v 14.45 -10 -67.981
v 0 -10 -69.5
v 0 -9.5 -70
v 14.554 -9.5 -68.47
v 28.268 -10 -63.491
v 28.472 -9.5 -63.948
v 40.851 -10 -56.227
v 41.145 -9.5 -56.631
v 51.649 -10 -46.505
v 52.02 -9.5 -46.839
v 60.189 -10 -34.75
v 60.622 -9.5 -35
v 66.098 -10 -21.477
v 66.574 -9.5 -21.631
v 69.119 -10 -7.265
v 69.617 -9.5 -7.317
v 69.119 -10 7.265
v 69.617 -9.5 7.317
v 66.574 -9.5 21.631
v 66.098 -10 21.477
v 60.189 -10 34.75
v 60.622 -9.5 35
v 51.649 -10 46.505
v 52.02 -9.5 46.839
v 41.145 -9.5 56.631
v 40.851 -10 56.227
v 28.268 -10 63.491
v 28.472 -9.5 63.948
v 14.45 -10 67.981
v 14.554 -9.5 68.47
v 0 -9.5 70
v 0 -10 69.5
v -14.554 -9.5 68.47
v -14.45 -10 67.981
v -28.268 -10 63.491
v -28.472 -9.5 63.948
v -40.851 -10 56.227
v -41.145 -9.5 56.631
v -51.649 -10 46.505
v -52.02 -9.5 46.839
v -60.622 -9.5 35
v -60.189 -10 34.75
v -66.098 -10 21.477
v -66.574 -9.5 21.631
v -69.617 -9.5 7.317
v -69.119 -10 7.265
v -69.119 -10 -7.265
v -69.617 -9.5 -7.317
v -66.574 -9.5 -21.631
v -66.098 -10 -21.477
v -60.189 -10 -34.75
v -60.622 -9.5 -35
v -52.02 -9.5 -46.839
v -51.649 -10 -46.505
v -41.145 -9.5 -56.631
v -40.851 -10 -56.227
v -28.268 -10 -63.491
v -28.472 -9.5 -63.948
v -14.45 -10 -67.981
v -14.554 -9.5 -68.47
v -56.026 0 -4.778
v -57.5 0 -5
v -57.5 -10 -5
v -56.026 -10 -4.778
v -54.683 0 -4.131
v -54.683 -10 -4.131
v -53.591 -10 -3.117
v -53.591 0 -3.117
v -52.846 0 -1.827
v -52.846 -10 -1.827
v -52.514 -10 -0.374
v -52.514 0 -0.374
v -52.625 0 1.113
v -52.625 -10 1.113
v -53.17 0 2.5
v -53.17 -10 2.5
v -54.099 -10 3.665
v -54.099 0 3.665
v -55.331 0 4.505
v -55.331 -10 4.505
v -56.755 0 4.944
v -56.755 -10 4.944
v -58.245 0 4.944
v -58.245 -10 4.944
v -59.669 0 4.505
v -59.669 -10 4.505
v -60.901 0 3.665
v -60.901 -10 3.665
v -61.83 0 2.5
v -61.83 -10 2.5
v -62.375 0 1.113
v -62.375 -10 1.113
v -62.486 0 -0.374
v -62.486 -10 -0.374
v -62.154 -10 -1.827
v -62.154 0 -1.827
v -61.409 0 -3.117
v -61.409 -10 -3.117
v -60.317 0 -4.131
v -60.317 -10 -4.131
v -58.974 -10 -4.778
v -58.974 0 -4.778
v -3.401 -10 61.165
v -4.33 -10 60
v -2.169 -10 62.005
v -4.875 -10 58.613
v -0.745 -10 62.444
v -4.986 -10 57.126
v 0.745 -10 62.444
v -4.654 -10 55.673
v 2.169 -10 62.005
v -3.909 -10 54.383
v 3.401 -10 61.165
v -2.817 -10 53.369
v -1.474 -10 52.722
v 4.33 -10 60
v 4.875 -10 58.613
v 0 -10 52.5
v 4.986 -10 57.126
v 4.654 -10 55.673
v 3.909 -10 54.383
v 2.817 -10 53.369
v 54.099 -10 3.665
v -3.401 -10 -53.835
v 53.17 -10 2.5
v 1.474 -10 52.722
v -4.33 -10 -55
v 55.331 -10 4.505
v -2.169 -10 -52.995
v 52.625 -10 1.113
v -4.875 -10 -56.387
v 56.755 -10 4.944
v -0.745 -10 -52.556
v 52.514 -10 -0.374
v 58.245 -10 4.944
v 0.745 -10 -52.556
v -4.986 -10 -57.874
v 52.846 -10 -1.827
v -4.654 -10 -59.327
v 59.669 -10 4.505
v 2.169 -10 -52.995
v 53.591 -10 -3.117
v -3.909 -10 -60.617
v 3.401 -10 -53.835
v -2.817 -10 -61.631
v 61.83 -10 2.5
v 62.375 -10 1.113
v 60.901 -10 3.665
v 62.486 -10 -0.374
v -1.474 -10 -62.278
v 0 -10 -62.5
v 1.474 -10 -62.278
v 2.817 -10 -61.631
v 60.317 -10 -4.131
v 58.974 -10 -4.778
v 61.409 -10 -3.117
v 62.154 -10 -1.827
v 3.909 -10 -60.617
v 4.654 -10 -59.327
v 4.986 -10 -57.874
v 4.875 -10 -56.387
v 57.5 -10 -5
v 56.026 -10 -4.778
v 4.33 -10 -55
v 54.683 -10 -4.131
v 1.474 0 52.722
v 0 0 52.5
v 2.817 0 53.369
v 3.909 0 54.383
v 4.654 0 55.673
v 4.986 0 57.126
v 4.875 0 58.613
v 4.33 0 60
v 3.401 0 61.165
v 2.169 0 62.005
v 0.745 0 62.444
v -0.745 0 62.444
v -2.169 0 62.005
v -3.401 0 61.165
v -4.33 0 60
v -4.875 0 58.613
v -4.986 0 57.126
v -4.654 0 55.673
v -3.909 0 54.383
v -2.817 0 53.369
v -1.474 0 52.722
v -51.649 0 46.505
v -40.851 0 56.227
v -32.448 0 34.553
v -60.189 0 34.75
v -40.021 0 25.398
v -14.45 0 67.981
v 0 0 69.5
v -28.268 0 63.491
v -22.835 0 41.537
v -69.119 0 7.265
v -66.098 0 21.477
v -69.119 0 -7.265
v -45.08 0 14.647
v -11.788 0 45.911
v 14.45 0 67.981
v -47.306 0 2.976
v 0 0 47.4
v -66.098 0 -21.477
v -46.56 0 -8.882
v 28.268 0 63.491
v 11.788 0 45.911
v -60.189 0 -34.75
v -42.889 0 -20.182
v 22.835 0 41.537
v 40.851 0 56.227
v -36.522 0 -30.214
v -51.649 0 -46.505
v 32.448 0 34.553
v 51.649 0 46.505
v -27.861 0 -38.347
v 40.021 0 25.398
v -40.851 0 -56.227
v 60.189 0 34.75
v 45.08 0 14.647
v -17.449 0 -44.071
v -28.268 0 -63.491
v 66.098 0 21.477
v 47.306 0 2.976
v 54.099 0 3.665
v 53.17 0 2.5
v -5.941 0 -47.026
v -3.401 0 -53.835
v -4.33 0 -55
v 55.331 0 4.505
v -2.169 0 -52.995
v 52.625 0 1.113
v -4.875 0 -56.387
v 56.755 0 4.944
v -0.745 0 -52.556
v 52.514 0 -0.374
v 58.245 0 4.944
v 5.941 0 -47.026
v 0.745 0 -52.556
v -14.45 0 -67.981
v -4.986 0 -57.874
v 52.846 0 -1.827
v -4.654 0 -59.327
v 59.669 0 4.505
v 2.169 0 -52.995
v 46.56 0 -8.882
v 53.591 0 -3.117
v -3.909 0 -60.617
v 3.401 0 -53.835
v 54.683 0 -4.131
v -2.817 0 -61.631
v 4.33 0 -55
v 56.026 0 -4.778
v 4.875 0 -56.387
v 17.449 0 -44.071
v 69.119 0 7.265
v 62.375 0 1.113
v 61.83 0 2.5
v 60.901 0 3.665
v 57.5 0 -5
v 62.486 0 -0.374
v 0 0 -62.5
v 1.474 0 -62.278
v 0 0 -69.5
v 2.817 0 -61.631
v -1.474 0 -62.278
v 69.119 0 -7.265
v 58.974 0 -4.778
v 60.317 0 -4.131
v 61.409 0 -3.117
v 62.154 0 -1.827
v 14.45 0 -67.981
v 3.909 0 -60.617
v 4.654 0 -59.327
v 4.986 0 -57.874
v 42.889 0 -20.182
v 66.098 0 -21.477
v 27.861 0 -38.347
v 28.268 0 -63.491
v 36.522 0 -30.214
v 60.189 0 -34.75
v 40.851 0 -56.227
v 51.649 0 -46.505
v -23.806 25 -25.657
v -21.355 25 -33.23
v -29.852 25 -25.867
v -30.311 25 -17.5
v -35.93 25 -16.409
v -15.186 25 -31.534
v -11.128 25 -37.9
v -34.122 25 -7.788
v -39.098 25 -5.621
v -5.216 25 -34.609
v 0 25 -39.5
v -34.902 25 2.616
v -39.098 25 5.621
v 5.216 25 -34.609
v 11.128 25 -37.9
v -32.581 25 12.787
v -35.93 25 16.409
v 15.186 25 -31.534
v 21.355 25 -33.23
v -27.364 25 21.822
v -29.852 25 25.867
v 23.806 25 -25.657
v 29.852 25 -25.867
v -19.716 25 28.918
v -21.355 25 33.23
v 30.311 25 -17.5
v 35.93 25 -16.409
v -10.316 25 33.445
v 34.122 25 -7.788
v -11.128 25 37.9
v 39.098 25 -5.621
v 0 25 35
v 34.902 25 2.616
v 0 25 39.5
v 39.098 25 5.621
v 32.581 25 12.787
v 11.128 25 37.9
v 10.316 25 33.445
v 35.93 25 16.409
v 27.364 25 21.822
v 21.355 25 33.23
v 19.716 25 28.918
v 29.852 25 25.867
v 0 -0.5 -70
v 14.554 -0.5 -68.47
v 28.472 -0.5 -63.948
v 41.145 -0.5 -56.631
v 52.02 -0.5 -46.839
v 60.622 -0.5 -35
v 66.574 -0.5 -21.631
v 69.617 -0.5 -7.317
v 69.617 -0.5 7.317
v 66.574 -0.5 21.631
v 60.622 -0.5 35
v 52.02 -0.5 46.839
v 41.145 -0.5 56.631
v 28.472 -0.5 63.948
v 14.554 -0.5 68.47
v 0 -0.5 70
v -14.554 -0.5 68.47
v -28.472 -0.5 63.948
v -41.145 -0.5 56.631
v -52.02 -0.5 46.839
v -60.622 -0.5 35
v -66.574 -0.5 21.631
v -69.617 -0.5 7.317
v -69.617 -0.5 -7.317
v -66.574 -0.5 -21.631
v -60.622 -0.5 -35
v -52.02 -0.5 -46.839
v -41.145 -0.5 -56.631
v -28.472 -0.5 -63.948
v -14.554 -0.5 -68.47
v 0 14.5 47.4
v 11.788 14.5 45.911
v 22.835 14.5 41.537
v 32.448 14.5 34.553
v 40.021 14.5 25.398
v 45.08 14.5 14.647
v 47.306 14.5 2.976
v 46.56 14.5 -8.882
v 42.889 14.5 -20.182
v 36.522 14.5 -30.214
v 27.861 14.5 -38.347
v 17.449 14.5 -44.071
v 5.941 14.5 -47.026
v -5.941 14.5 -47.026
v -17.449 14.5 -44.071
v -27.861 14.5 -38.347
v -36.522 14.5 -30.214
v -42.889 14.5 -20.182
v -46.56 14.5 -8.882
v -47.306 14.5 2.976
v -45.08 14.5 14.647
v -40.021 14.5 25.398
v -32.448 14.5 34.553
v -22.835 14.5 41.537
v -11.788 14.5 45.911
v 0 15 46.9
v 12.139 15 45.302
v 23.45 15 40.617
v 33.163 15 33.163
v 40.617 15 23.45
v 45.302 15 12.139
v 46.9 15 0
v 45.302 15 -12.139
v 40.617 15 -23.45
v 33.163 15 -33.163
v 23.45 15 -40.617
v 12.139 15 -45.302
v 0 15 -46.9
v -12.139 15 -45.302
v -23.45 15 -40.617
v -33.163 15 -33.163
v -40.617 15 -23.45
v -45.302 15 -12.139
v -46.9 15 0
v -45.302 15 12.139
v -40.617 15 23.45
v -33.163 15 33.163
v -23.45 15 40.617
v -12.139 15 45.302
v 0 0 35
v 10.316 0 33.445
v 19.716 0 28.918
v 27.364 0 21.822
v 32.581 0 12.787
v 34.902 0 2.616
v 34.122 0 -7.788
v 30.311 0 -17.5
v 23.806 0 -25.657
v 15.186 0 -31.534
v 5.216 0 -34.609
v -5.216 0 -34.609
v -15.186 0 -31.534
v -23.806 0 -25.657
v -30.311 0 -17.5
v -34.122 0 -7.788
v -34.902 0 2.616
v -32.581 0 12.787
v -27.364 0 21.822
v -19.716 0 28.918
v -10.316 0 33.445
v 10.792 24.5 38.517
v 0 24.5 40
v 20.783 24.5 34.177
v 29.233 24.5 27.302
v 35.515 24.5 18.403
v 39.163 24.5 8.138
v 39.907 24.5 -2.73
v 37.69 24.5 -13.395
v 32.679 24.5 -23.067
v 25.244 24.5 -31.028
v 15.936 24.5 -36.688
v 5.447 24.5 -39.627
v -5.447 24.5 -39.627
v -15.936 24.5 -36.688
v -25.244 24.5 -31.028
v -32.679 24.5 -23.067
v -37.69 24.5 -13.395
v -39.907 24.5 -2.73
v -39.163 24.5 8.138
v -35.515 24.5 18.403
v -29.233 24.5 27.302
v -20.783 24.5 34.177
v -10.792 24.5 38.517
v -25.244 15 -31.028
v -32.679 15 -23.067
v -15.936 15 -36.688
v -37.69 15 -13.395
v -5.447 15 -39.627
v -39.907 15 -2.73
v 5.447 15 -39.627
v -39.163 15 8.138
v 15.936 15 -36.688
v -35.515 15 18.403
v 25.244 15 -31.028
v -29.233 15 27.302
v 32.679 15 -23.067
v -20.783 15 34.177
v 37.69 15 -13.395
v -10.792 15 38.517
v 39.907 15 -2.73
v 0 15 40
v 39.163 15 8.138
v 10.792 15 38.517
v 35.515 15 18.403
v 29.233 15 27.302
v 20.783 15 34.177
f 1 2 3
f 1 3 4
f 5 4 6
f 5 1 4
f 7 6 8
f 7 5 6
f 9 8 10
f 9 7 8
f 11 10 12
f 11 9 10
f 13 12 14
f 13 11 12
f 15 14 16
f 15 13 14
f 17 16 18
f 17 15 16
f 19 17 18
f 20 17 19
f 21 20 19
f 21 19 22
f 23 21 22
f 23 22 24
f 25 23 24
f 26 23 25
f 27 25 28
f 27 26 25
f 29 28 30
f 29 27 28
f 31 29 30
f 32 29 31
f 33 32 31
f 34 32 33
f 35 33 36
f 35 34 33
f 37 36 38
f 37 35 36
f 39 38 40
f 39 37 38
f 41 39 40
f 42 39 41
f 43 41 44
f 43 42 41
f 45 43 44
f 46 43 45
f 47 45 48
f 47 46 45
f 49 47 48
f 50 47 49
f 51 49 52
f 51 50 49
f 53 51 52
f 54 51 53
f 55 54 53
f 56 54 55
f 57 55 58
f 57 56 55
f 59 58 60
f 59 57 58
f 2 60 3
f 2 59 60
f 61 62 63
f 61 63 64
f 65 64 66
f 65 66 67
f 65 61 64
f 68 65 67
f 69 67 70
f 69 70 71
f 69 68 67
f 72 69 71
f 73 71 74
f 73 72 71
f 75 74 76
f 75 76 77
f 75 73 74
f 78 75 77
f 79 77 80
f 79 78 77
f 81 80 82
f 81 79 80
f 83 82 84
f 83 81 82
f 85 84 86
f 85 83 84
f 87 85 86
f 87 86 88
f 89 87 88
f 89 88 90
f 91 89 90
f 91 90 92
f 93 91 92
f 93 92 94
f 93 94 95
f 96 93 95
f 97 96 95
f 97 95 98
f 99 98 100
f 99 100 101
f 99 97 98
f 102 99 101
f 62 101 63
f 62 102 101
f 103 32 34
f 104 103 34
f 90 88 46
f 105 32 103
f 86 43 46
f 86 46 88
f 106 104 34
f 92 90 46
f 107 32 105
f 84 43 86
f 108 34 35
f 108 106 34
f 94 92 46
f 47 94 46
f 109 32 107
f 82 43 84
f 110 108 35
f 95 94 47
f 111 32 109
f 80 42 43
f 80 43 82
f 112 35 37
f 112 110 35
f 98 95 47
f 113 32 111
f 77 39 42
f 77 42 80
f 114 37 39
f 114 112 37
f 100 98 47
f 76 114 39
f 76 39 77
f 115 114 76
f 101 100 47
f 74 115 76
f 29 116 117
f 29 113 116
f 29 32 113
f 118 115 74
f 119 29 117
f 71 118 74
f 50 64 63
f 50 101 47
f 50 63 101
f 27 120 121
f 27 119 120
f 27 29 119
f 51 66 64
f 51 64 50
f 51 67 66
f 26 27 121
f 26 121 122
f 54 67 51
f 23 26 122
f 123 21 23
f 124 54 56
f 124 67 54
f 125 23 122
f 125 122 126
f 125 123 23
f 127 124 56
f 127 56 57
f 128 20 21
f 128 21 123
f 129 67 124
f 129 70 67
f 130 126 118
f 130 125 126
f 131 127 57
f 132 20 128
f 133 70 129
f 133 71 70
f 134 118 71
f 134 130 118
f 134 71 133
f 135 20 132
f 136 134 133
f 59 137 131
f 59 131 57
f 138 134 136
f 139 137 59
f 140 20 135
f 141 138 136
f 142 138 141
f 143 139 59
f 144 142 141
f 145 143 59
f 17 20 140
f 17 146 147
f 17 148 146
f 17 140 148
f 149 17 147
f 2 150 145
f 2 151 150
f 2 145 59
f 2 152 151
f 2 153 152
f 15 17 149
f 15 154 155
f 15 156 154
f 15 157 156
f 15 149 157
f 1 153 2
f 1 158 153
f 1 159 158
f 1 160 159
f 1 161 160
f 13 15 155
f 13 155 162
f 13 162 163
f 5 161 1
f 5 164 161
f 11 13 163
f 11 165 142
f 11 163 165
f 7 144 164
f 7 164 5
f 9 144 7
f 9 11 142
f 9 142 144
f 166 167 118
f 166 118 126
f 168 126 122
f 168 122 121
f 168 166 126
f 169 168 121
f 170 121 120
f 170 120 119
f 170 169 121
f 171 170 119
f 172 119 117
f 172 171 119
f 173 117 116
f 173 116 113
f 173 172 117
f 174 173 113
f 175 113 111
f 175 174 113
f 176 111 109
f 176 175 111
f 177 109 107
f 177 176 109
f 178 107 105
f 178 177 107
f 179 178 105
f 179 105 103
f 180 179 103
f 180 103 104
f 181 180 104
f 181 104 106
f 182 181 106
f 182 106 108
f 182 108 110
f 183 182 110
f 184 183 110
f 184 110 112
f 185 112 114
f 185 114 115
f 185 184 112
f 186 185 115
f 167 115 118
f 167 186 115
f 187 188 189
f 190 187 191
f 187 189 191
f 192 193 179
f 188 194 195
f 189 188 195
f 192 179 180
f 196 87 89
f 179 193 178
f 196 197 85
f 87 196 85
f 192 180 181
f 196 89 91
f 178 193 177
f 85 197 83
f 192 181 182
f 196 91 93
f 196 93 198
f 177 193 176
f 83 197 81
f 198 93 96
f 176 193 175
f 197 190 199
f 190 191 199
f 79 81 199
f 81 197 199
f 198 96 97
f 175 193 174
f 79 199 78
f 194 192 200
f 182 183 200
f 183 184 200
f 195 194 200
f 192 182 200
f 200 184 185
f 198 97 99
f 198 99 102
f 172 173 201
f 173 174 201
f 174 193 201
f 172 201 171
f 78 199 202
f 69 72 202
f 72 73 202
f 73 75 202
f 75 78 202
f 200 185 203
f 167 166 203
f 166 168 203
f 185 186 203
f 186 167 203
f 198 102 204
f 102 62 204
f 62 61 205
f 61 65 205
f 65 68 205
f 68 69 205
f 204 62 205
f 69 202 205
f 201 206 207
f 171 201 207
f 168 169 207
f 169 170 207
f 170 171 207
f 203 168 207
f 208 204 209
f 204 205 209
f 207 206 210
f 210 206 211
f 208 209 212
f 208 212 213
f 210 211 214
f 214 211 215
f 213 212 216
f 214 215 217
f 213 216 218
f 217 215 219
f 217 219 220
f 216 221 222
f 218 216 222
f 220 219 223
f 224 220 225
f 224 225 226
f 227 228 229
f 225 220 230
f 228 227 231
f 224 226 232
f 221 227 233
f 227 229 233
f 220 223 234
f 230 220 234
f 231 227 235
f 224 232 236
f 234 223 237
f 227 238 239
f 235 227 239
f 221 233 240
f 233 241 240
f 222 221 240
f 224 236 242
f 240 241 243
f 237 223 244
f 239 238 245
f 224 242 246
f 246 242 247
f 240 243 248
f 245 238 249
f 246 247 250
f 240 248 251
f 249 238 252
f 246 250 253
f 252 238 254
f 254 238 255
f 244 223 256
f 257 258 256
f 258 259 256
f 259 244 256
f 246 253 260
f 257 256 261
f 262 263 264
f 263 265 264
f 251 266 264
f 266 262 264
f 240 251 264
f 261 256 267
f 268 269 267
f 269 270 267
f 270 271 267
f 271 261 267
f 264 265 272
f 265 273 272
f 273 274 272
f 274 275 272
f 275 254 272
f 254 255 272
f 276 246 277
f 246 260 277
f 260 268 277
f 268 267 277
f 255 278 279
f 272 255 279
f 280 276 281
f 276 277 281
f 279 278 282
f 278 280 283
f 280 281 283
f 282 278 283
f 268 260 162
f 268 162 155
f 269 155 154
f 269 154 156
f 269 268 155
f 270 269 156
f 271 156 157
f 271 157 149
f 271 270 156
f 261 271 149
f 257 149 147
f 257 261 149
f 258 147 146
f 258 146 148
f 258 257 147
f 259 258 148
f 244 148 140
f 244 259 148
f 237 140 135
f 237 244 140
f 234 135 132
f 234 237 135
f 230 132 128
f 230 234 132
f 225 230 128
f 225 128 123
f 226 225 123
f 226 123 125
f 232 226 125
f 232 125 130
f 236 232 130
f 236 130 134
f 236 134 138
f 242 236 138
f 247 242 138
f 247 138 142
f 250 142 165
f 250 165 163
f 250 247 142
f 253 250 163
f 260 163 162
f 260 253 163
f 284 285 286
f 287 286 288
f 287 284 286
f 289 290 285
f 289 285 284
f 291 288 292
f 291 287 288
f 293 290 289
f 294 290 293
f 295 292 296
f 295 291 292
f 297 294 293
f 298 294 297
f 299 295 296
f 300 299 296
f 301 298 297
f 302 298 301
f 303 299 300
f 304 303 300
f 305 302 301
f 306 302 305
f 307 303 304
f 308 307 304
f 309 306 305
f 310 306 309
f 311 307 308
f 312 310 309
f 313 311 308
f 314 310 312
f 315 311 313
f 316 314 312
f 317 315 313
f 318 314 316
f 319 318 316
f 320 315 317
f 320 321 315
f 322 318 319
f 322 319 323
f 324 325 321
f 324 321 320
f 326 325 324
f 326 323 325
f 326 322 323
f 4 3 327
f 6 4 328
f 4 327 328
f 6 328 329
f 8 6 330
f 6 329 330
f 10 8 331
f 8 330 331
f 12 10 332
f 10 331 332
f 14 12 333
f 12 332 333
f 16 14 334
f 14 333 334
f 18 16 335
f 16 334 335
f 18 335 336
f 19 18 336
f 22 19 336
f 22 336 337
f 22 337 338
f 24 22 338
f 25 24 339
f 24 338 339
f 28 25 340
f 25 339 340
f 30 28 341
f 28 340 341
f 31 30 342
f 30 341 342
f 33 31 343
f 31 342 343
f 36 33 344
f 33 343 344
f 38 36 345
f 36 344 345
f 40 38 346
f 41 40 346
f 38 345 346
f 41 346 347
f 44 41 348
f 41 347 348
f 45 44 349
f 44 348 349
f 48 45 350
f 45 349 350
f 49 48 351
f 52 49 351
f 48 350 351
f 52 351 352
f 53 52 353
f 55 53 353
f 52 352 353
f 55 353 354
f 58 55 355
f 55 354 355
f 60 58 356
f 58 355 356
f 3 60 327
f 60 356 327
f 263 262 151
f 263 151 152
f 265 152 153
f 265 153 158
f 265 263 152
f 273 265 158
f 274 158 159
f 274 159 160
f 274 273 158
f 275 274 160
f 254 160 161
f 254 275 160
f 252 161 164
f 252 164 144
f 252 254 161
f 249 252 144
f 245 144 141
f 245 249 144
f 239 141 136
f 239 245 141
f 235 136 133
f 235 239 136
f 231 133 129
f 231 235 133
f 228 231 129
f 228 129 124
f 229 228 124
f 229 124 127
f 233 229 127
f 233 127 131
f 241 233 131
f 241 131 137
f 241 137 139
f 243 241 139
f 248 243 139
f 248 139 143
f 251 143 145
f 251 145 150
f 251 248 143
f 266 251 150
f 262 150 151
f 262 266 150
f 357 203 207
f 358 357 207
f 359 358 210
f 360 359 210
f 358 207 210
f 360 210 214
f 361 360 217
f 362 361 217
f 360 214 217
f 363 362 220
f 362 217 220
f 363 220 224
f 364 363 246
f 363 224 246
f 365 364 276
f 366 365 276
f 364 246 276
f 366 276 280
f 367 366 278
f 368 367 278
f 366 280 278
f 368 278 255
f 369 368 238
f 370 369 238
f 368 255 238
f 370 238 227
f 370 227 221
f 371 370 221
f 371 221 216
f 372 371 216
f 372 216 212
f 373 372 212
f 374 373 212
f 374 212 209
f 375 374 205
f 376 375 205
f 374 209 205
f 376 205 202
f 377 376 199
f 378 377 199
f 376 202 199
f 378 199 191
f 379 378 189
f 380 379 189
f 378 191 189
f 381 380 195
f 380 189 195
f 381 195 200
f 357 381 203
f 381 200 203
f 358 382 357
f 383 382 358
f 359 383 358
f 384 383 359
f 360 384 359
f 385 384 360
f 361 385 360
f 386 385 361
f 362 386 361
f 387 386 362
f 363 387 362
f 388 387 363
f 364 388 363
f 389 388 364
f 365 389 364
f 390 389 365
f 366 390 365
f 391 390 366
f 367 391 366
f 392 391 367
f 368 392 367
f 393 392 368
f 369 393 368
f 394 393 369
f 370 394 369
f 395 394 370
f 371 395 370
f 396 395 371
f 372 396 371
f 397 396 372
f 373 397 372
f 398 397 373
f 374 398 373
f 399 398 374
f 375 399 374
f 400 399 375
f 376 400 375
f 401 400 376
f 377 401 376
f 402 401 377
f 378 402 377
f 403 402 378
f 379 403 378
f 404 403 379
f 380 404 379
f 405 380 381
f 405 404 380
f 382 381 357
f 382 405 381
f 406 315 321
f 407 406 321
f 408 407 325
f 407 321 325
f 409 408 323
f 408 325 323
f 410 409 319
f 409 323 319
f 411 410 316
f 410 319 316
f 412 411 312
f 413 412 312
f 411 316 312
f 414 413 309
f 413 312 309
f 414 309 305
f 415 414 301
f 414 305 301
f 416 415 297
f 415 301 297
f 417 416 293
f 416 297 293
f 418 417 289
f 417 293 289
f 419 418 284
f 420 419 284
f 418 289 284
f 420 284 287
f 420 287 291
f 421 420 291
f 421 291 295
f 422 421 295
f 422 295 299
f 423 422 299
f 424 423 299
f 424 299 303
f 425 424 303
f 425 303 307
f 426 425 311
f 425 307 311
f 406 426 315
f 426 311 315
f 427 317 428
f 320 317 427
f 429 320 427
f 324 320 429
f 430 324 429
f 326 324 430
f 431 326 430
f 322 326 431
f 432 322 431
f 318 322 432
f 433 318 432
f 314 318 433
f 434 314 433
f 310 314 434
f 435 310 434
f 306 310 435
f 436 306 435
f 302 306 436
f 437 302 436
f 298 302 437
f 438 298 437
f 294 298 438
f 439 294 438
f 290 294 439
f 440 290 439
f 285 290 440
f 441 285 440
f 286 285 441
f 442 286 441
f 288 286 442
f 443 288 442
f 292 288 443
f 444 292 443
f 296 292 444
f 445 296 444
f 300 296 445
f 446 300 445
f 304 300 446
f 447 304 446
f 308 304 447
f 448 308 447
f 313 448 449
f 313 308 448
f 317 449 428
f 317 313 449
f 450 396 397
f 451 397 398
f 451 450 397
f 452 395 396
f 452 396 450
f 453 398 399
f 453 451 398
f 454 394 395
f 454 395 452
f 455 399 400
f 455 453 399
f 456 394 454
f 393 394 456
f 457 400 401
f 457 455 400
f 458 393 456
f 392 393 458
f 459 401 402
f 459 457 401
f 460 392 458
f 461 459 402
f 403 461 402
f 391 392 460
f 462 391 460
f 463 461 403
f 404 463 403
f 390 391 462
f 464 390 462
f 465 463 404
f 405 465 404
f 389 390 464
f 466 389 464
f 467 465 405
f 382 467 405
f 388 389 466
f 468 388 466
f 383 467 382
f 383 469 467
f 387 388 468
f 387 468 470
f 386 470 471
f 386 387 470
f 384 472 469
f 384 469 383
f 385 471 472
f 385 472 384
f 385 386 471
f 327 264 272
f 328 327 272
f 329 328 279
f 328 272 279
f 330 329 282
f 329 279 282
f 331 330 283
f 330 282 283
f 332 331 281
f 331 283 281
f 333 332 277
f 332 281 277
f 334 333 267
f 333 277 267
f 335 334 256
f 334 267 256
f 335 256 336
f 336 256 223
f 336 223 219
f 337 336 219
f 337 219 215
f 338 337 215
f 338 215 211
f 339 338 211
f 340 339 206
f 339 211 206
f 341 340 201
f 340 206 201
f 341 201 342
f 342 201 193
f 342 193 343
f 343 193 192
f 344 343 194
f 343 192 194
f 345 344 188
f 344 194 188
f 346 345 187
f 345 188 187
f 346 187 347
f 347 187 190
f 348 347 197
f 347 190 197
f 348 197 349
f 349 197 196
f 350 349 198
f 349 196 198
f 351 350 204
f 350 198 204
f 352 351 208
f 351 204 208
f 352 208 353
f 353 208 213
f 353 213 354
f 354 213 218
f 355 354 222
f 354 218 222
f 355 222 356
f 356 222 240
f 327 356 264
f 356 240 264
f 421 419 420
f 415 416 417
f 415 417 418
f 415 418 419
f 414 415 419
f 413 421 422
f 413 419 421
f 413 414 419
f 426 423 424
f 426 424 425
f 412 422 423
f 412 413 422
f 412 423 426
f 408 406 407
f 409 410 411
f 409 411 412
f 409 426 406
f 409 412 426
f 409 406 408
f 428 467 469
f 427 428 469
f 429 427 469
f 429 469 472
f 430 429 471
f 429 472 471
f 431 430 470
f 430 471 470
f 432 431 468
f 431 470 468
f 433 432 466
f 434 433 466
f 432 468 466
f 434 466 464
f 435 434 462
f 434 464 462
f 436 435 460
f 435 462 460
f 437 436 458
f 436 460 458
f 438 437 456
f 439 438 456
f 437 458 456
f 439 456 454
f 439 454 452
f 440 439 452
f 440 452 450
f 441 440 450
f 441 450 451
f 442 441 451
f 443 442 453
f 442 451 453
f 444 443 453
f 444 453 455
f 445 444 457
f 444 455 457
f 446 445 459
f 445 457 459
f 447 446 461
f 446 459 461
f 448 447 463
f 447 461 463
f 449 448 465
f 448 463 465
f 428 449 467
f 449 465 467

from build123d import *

# Parameters (mm, degrees)
SKETCH_1_R          = 47.4
EXTRUDE_1_DEPTH     = 15
SKETCH_2_R          = 40
EXTRUDE_2_DEPTH     = 10
SKETCH_3_R          = 70
SKETCH_3_R_2        = 5
EXTRUDE_3_DEPTH     = 10
SKETCH_4_R          = 35
CUT_EXTRUDE_1_DEPTH = 25
CHAMFER_1_SIZE      = 0.5


with BuildPart() as part:
    # 草图1 → 凸台-拉伸1 (new body)
    with BuildSketch(Plane(origin=(0, 0, 0), x_dir=(1, 0, 0), z_dir=(0, 1, 0))):
        with Locations(Location((0, 0, 0), (0, 0, 270))):
            Circle(SKETCH_1_R)
    extrude(amount=EXTRUDE_1_DEPTH)

    # 草图2 → 凸台-拉伸2 (add)
    with BuildSketch(Plane(origin=(0, 15, 0), x_dir=(1, 0, 0), z_dir=(0, 1, 0))):
        with Locations(Location((0, 0, 0), (0, 0, 270))):
            Circle(SKETCH_2_R)
    extrude(amount=EXTRUDE_2_DEPTH)

    # 草图3 → 凸台-拉伸3 (add)
    with BuildSketch(Plane.XZ):
        with Locations(Location((0, 0, 0), (0, 0, 270))):
            Circle(SKETCH_3_R)
        with Locations(Location((0, 57.5, 0), (0, 0, 270))):
            Circle(SKETCH_3_R_2, mode=Mode.SUBTRACT)
        with Locations(Location((57.5, 0, 0), (0, 0, 270))):
            Circle(SKETCH_3_R_2, mode=Mode.SUBTRACT)
        with Locations(Location((0, -57.5, 0), (0, 0, 270))):
            Circle(SKETCH_3_R_2, mode=Mode.SUBTRACT)
        with Locations(Location((-57.5, 0, 0), (0, 0, 270))):
            Circle(SKETCH_3_R_2, mode=Mode.SUBTRACT)
    extrude(amount=EXTRUDE_3_DEPTH)

    # 草图4 → 切除-拉伸1 (cut)
    with BuildSketch(Plane(origin=(0, 25, 0), x_dir=(1, 0, 0), z_dir=(0, 1, 0))):
        with Locations(Location((0, 0, 0), (0, 0, 270))):
            Circle(SKETCH_4_R)
    extrude(amount=-CUT_EXTRUDE_1_DEPTH, mode=Mode.SUBTRACT)

    # 倒角1
    chamfer_1_edges = [part.edges().sort_by_distance(p)[0] for p in [
        (0, 0, 70),
        (0, 15, -47.4),
        (0, 25, -40),
        (0, -10, 70),
    ]]
    chamfer(chamfer_1_edges, length=CHAMFER_1_SIZE)


solid = part.part
